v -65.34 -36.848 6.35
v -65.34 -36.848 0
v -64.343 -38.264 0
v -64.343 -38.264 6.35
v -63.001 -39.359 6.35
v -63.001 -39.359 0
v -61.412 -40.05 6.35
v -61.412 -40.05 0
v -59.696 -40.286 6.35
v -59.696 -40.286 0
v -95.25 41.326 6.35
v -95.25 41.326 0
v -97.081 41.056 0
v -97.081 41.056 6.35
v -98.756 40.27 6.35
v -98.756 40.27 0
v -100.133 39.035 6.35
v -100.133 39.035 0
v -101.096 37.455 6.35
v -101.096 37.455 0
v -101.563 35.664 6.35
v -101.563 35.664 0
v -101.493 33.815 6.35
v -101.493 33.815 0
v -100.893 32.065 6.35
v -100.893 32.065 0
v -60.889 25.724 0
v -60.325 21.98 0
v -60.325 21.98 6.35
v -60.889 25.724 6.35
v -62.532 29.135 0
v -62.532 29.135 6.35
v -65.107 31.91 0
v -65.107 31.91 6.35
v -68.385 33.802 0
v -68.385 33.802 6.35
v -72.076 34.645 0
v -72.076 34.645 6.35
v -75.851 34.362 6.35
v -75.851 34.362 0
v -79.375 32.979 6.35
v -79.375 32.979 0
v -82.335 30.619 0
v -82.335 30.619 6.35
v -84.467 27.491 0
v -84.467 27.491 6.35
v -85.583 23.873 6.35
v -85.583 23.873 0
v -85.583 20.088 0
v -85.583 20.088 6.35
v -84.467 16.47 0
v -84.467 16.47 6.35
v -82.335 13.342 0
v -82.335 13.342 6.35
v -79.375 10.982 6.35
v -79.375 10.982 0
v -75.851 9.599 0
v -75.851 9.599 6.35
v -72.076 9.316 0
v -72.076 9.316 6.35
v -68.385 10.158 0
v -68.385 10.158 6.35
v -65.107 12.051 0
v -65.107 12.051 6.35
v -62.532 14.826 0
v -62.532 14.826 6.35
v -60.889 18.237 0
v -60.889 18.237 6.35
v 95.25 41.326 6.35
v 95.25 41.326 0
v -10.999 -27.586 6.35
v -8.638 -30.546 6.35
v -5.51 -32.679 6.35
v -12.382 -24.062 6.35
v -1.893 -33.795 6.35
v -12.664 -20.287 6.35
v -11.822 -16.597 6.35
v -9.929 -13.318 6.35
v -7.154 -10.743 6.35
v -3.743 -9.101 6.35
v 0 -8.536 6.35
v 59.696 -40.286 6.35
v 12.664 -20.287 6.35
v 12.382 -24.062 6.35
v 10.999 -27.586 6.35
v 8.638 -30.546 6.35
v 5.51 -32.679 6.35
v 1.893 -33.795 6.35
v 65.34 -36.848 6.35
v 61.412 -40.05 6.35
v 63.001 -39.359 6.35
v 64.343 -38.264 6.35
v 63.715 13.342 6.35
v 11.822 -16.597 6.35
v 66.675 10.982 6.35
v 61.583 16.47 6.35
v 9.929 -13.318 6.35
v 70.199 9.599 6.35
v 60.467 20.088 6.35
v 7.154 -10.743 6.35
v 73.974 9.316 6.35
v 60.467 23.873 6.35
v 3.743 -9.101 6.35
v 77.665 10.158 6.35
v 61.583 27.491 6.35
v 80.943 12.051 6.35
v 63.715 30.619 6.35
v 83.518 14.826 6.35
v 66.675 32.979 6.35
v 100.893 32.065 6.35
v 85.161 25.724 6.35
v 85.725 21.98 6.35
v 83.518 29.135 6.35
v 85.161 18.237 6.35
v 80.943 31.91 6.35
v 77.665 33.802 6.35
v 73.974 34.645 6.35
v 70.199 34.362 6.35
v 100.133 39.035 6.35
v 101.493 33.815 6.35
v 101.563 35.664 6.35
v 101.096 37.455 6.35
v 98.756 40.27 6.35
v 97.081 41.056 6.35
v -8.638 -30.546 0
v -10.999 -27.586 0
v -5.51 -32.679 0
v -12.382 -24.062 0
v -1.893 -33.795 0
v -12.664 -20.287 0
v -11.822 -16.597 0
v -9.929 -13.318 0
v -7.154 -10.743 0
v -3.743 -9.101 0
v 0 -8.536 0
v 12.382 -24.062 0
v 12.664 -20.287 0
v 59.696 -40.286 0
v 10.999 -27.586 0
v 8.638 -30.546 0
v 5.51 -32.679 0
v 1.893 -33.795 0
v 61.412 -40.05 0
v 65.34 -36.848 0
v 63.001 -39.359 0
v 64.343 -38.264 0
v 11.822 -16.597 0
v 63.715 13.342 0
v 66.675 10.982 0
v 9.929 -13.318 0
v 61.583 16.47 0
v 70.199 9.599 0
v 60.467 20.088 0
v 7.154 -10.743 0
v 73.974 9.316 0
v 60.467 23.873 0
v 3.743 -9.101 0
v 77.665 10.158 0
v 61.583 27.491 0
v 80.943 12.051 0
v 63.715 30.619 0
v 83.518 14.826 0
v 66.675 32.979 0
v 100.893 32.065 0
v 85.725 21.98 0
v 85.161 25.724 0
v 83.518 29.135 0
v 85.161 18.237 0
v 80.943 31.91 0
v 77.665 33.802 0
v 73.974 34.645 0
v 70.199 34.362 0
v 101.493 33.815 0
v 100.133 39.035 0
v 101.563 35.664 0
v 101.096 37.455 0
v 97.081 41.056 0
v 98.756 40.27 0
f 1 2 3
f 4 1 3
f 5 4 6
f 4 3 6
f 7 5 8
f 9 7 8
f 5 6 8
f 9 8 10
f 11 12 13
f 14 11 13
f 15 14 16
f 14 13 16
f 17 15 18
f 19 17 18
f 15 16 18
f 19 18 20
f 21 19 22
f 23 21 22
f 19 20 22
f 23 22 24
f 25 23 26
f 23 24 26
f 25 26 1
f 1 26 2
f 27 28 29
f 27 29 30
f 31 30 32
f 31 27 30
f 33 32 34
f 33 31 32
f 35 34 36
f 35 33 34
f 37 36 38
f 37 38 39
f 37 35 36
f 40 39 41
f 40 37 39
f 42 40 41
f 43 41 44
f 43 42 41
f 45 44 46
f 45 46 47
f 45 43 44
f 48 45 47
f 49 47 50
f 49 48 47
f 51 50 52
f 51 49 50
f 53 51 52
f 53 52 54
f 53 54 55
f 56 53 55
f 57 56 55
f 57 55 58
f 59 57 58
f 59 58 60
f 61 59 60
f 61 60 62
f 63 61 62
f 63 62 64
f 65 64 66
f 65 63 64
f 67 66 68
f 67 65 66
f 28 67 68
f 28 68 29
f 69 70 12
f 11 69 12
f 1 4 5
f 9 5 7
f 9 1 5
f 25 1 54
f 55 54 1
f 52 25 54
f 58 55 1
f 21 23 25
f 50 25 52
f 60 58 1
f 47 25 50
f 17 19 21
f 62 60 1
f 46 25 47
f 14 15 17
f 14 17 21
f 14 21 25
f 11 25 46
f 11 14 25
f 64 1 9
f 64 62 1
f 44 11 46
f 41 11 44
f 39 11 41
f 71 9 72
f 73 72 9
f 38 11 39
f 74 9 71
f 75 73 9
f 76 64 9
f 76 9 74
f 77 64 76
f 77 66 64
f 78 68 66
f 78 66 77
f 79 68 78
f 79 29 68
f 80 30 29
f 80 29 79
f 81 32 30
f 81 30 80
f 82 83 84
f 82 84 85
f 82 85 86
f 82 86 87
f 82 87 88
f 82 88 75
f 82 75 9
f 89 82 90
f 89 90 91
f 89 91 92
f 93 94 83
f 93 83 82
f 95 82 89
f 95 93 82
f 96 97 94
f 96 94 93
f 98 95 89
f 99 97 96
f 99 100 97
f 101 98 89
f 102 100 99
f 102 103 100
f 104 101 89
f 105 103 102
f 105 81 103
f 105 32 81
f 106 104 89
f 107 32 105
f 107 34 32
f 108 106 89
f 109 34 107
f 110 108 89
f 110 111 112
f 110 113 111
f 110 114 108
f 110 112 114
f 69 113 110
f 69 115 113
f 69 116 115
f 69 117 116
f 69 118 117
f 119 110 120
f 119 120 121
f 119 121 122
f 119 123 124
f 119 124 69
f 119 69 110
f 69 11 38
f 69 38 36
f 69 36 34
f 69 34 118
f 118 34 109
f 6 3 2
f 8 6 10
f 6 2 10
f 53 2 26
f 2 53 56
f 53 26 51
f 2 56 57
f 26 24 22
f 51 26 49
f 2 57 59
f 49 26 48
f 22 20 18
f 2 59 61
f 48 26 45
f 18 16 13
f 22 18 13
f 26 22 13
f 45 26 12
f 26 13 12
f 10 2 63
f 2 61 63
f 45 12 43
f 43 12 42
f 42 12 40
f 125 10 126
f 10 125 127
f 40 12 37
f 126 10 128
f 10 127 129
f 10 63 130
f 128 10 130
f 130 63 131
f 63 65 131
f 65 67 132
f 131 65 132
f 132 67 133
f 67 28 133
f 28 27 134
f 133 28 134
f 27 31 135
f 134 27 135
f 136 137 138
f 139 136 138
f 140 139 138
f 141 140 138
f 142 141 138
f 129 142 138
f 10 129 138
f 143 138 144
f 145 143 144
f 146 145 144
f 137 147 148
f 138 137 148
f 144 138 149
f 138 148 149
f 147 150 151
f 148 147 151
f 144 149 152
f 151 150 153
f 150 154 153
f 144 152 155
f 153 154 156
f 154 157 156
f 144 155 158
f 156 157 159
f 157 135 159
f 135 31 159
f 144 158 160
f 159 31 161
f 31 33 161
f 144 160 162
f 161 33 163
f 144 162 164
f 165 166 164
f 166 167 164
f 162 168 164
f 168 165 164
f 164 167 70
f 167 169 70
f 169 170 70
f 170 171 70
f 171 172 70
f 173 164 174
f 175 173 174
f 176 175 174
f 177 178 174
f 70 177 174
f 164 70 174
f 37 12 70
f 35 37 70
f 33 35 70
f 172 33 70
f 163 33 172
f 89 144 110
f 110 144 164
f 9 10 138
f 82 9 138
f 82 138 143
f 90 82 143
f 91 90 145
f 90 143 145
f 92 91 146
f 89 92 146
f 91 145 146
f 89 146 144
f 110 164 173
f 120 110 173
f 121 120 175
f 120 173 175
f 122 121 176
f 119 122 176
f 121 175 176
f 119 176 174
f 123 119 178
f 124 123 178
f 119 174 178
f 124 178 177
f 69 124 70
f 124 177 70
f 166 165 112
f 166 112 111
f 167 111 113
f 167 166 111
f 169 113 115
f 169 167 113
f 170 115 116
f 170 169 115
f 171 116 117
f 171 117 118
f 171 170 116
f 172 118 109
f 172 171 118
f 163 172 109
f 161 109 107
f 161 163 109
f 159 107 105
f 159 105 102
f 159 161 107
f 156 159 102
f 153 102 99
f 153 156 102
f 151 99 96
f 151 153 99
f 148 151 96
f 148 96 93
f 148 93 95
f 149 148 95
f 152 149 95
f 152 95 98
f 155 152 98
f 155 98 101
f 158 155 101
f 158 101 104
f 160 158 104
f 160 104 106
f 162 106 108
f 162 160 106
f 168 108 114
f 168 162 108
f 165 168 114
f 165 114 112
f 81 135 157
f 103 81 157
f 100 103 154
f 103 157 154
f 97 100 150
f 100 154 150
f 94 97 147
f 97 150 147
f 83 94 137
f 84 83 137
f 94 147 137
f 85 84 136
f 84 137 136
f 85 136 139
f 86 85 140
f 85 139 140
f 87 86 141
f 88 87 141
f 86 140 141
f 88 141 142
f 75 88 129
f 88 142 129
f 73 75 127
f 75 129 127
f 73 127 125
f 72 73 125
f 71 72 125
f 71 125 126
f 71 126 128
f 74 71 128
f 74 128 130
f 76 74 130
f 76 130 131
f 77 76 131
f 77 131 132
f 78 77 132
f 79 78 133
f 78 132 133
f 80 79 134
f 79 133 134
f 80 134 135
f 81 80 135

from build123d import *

# Parameters (mm, degrees)
F0_R     = 12.7
F1_DEPTH = 6.35


with BuildPart() as f1:
    # F0 (on Top) → F1 (new body)
    with BuildSketch(Plane.XY):
        with BuildLine():
            Line((0, -8.536373), (0, 41.326012))
            Line((0, 41.326012), (-95.25, 41.326012))
            ThreePointArc((-95.25, 41.326012), (-100.672652, 38.280153), (-100.893214, 32.064546))
            Line((-100.893214, 32.064546), (-65.33969, -36.84784))
            ThreePointArc((-65.33969, -36.84784), (-63.000616, -39.359026), (-59.696476, -40.286373))
            Line((-59.696476, -40.286373), (0, -40.286373))
            Line((0, -40.286373), (0, -33.936373))
            ThreePointArc((0, -33.936373), (-12.7, -21.236373), (0, -8.536373))
        make_face()
        with Locations((-73.025, 21.980401)):
            Circle(F0_R, mode=Mode.SUBTRACT)
        with BuildLine():
            Line((95.25, 41.326012), (0, 41.326012))
            Line((0, 41.326012), (0, -8.536373))
            ThreePointArc((0, -8.536373), (12.7, -21.236373), (0, -33.936373))
            Line((0, -33.936373), (0, -40.286373))
            Line((0, -40.286373), (59.696476, -40.286373))
            ThreePointArc((59.696476, -40.286373), (63.000616, -39.359026), (65.33969, -36.84784))
            Line((65.33969, -36.84784), (100.893214, 32.064546))
            ThreePointArc((100.893214, 32.064546), (100.672652, 38.280153), (95.25, 41.326012))
        make_face()
        with Locations((73.025, 21.980401)):
            Circle(F0_R, mode=Mode.SUBTRACT)
    extrude(amount=F1_DEPTH)


solid = f1.part
